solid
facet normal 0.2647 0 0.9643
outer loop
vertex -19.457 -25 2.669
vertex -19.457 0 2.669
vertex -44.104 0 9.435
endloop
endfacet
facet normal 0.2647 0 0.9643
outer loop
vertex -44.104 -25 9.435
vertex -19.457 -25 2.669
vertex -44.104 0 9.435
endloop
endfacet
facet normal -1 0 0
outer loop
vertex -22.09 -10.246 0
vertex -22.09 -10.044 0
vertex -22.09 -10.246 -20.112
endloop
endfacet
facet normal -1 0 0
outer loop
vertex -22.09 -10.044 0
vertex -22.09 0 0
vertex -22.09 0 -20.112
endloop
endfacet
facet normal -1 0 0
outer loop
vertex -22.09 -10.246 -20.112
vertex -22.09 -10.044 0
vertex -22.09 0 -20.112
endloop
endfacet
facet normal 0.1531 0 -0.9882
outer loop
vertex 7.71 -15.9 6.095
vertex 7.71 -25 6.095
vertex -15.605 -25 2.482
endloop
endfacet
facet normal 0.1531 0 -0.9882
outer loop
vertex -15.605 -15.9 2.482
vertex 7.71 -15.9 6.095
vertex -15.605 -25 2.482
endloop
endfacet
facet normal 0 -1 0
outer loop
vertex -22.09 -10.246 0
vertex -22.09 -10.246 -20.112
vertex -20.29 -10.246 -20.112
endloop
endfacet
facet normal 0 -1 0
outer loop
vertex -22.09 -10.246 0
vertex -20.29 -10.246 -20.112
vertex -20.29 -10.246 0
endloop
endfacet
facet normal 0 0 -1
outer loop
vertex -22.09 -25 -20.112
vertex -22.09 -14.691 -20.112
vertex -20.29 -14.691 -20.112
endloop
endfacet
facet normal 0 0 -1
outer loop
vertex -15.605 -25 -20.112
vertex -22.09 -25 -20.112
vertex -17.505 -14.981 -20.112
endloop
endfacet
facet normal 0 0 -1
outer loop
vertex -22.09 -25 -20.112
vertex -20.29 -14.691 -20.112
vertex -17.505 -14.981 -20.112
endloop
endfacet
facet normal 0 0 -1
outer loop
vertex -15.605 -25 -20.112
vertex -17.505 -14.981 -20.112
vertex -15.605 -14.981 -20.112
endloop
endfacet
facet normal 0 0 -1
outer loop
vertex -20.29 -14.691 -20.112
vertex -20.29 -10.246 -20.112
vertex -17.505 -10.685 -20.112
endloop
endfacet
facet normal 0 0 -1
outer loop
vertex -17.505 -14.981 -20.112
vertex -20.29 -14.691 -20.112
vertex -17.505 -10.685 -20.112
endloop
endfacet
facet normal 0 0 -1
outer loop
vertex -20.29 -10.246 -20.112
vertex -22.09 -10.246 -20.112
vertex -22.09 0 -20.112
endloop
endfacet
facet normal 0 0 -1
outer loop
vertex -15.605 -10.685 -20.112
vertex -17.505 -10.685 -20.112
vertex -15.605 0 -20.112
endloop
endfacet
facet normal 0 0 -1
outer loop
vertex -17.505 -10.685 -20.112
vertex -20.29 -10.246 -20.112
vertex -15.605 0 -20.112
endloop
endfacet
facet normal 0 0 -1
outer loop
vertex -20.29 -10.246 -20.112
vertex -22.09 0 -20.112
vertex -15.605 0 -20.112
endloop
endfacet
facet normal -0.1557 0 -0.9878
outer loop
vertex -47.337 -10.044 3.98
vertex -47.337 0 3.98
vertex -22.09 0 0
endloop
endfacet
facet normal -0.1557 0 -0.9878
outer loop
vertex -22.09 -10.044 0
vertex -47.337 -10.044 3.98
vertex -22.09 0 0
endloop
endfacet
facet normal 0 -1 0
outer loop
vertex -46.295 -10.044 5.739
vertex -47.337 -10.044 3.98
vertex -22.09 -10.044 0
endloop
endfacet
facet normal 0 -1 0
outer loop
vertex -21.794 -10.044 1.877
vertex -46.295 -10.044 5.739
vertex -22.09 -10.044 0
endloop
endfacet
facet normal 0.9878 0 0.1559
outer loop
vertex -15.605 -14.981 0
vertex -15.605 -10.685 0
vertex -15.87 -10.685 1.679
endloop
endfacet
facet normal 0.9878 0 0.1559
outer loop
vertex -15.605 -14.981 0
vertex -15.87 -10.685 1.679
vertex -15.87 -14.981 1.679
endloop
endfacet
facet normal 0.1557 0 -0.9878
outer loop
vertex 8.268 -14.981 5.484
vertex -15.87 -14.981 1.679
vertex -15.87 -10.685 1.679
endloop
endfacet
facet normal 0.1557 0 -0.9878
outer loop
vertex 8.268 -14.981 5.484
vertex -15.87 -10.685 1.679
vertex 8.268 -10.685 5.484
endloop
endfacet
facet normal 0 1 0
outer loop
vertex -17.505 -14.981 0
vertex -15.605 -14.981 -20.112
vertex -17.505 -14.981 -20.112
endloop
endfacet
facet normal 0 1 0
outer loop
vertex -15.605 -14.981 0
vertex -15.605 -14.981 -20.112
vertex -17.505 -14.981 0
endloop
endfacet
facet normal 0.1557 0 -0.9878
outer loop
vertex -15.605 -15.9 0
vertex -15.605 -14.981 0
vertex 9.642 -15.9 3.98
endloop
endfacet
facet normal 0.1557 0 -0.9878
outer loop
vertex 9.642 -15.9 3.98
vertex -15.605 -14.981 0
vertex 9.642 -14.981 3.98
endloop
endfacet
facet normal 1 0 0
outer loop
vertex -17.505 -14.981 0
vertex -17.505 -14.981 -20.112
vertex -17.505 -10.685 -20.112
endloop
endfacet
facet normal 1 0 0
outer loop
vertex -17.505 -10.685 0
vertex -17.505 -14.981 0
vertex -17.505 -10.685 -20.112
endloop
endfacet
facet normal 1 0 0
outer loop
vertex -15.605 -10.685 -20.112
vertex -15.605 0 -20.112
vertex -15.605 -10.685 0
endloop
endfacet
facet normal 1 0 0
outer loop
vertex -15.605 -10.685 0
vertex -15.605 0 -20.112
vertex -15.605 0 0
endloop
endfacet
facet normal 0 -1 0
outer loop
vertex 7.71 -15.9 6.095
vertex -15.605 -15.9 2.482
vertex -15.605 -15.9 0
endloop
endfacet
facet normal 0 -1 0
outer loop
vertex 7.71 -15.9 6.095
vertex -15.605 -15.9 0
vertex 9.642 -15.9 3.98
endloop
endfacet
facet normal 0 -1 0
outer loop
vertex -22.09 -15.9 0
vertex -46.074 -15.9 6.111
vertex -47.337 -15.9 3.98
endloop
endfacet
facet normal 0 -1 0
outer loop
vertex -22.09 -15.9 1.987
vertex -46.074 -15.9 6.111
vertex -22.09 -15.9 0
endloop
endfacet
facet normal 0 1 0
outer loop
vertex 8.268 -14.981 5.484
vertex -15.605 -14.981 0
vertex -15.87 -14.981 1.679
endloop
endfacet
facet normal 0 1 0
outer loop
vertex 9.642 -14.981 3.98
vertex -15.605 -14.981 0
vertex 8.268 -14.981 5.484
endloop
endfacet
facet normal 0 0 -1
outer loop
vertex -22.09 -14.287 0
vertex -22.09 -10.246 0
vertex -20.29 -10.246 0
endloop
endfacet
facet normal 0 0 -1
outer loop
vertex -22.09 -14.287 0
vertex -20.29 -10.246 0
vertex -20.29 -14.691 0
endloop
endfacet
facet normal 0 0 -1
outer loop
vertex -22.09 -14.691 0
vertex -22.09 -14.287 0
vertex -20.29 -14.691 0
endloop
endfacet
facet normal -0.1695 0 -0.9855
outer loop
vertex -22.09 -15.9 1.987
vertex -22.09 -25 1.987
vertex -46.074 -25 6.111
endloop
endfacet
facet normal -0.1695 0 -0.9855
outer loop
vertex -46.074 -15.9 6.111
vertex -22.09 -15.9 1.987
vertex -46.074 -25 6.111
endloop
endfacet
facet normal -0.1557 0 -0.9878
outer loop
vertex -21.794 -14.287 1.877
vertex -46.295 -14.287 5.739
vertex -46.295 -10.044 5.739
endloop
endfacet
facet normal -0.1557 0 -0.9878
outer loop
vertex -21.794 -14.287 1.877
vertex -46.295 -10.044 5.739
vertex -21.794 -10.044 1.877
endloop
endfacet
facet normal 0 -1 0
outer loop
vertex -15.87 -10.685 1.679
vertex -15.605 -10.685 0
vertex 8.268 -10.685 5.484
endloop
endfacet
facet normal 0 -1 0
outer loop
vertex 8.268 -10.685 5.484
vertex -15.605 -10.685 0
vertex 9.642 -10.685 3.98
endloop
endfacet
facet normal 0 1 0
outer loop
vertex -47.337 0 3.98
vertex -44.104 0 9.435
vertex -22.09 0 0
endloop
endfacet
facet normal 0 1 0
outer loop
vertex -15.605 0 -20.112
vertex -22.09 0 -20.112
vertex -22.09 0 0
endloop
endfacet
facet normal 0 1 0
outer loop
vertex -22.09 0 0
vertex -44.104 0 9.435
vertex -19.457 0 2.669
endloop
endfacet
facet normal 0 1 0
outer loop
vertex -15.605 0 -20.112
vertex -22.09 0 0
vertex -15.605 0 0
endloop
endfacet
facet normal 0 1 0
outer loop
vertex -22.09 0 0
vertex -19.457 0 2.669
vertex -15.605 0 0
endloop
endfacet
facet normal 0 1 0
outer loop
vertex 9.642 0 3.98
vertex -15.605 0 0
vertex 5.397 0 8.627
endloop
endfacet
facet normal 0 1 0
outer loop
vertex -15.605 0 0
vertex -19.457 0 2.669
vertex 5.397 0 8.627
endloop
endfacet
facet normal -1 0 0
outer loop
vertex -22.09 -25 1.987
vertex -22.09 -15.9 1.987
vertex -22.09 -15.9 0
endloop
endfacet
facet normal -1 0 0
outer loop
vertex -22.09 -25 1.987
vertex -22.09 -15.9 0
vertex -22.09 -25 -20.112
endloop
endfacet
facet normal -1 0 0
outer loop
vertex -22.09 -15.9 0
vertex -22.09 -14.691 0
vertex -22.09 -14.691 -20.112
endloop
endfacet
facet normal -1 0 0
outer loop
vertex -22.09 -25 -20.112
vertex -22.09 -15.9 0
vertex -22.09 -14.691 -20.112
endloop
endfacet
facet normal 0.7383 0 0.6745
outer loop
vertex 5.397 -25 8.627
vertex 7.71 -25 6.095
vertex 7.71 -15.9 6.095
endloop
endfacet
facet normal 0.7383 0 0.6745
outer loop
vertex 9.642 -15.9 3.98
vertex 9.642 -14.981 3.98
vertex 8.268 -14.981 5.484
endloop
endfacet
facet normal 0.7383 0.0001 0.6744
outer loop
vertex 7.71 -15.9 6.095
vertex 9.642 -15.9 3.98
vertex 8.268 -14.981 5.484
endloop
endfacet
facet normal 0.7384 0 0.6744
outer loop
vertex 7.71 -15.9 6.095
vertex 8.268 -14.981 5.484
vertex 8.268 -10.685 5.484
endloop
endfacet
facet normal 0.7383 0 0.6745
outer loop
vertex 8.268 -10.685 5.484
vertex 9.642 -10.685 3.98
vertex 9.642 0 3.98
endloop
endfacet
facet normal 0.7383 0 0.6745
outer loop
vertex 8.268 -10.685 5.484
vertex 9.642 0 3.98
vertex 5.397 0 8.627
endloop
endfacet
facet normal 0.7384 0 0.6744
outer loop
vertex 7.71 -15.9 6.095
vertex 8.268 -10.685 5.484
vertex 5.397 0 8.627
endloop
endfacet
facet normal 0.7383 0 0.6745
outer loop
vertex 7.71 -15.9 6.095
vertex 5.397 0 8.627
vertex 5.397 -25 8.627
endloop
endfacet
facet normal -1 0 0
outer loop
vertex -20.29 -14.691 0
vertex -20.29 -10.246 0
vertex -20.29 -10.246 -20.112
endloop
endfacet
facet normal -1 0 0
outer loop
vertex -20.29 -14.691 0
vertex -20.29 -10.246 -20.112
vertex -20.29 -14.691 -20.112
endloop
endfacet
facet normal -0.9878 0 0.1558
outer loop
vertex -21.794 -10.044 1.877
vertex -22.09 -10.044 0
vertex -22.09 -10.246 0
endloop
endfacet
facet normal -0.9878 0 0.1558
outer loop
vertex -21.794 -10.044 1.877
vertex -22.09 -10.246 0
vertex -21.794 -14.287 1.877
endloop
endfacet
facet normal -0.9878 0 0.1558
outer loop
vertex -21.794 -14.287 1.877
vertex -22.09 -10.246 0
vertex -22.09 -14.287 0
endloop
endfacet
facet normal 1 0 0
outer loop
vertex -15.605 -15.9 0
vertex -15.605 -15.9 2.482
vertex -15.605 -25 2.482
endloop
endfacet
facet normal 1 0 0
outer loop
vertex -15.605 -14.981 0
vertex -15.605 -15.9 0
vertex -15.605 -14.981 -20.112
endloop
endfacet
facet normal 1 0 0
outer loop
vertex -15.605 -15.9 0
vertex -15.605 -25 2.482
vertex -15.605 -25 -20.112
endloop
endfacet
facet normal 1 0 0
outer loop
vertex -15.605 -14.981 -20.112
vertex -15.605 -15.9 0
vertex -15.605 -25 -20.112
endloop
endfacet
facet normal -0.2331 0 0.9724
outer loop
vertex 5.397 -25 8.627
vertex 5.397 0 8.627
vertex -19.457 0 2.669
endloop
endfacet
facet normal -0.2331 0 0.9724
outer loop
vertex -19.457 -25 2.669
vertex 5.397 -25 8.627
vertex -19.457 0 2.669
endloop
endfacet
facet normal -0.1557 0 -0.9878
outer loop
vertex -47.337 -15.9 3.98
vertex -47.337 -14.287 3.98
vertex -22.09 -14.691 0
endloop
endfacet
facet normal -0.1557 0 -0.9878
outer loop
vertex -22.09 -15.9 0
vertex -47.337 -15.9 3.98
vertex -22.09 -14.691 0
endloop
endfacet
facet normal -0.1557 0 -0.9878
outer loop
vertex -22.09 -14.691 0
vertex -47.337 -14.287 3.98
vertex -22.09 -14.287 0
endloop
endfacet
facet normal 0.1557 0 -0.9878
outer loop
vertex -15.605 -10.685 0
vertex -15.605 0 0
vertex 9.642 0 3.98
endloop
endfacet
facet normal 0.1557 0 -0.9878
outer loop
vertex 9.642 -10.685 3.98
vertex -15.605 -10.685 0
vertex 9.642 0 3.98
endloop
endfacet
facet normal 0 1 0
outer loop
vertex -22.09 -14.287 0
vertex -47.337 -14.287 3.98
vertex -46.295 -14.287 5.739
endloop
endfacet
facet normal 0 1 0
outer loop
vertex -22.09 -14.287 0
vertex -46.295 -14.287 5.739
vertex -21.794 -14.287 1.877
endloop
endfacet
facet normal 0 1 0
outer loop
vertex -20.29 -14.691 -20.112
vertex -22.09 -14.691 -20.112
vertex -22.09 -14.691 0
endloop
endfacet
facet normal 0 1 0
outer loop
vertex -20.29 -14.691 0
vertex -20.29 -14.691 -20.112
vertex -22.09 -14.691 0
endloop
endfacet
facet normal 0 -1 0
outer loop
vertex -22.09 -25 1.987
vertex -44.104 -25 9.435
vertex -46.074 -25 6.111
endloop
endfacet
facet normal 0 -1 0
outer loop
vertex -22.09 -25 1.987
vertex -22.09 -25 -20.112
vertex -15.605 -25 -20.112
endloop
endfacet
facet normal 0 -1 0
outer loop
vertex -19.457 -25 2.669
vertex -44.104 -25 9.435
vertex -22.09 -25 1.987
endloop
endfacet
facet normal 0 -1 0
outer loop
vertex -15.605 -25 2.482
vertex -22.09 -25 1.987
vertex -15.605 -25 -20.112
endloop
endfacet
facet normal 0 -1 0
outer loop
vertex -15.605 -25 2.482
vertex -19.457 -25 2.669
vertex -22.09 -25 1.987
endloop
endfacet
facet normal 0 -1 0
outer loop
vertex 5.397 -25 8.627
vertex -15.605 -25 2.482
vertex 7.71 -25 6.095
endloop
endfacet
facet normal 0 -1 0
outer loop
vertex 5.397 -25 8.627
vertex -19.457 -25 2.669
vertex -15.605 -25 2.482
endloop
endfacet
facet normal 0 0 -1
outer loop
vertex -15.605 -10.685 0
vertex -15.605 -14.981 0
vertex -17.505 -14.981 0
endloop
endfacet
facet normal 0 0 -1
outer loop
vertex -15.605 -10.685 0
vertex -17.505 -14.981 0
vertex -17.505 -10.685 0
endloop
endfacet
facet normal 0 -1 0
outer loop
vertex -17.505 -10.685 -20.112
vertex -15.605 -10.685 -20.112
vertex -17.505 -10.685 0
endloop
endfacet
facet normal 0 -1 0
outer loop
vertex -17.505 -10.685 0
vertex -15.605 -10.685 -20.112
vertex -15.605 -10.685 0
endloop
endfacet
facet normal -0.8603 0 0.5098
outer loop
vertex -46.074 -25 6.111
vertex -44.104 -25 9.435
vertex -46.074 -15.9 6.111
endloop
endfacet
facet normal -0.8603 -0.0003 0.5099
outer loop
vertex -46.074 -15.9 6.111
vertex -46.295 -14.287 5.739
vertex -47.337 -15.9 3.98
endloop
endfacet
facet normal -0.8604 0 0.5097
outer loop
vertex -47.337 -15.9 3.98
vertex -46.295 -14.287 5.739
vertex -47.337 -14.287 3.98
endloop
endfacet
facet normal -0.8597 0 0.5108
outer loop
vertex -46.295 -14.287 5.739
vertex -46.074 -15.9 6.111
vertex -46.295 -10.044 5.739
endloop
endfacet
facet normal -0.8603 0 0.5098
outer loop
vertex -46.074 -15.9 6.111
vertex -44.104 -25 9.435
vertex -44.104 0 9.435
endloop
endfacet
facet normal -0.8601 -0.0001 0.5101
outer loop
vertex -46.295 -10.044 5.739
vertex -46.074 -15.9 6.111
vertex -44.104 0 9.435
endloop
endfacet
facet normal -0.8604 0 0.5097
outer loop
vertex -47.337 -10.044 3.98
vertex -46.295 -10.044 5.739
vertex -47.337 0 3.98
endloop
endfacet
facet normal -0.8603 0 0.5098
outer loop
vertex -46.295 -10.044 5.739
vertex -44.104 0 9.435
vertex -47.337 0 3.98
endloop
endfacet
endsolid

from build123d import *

# Parameters (mm, degrees)
F1_DEPTH  = 25
F2_W      = 25.5589389365
F2_H      = 4.2958939448
F3_DEPTH  = 1.7
F4_W      = 4.2958939448
F4_H      = 20.1124101877
F5_DEPTH  = 1.9
F6_W      = 4.4450499117
F6_H      = 20.1124101877
F8_DEPTH  = 1.8
F7_W      = 25.5589389365
F7_H      = 4.2430022731
F9_DEPTH  = 1.9
F11_DEPTH = 9.1


with BuildPart() as f1:
    # F0 (on Front) → F1 (new body)
    with BuildSketch(Plane.XZ):
        Polygon((-19.4574361484, 2.6685861076), (-44.104386121, 9.4352113083), (-47.3371483386, 3.9799264632), (-22.0899792911, 0), (-22.0899792911, -20.1124101877), (-15.6050544099, -20.1124101877), (-15.6050544099, 0), (9.6421146375, 3.9799264632), (5.3972699679, 8.6270207539), align=None)
    extrude(amount=F1_DEPTH)

    # F2 (on face) → F3 (cut)
    with BuildSketch(Plane(origin=(-0.378381367, 0, 2.4003102636), x_dir=(0.9878019236, 0, 0.1557156372), z_dir=(0.1557156372, 0, -0.9878019236))):
        with Locations((-2.6352332962, 12.8331626765)):
            Rectangle(F2_W, F2_H)
    extrude(amount=-F3_DEPTH, mode=Mode.SUBTRACT)

    # F4 (on face) → F5 (cut)
    with BuildSketch(Plane.YZ.offset(-15.6050544099)):
        with Locations((-12.8331626765, -10.0562050939)):
            Rectangle(F4_W, F4_H)
    extrude(amount=-F5_DEPTH, mode=Mode.SUBTRACT)

    # F6 (on face) → F8 (cut)
    with BuildSketch(Plane(origin=(-22.0899792911, 0, 0), x_dir=(0, -1, 0), z_dir=(-1, 0, 0))):
        with Locations((12.4689359218, -10.0562050939)):
            Rectangle(F6_W, F6_H)
    extrude(amount=-F8_DEPTH, mode=Mode.SUBTRACT)

    # F7 (on face) → F9 (cut)
    with BuildSketch(Plane(origin=(-0.5356236731, 0, -3.3977968049), x_dir=(0.9878019236, 0, -0.1557156372), z_dir=(-0.1557156372, 0, -0.9878019236))):
        with Locations((-34.599993505, 12.1658644639)):
            Rectangle(F7_W, F7_H)
    extrude(amount=-F9_DEPTH, mode=Mode.SUBTRACT)

    # F10 (on face) → F11 (cut)
    with BuildSketch(Plane.XZ.offset(25)):
        Polygon((-22.0899792911, 1.9871564582), (-46.0743617449, 6.1108782943), (-47.3371483386, 3.9799264632), (-22.0899792911, 0), align=None)
        Polygon((9.6421146375, 3.9799264632), (7.7104689044, 6.0946186502), (-15.6050544099, 2.4822140113), (-15.6050544099, 0), align=None)
    extrude(amount=-F11_DEPTH, mode=Mode.SUBTRACT)


solid = f1.part
